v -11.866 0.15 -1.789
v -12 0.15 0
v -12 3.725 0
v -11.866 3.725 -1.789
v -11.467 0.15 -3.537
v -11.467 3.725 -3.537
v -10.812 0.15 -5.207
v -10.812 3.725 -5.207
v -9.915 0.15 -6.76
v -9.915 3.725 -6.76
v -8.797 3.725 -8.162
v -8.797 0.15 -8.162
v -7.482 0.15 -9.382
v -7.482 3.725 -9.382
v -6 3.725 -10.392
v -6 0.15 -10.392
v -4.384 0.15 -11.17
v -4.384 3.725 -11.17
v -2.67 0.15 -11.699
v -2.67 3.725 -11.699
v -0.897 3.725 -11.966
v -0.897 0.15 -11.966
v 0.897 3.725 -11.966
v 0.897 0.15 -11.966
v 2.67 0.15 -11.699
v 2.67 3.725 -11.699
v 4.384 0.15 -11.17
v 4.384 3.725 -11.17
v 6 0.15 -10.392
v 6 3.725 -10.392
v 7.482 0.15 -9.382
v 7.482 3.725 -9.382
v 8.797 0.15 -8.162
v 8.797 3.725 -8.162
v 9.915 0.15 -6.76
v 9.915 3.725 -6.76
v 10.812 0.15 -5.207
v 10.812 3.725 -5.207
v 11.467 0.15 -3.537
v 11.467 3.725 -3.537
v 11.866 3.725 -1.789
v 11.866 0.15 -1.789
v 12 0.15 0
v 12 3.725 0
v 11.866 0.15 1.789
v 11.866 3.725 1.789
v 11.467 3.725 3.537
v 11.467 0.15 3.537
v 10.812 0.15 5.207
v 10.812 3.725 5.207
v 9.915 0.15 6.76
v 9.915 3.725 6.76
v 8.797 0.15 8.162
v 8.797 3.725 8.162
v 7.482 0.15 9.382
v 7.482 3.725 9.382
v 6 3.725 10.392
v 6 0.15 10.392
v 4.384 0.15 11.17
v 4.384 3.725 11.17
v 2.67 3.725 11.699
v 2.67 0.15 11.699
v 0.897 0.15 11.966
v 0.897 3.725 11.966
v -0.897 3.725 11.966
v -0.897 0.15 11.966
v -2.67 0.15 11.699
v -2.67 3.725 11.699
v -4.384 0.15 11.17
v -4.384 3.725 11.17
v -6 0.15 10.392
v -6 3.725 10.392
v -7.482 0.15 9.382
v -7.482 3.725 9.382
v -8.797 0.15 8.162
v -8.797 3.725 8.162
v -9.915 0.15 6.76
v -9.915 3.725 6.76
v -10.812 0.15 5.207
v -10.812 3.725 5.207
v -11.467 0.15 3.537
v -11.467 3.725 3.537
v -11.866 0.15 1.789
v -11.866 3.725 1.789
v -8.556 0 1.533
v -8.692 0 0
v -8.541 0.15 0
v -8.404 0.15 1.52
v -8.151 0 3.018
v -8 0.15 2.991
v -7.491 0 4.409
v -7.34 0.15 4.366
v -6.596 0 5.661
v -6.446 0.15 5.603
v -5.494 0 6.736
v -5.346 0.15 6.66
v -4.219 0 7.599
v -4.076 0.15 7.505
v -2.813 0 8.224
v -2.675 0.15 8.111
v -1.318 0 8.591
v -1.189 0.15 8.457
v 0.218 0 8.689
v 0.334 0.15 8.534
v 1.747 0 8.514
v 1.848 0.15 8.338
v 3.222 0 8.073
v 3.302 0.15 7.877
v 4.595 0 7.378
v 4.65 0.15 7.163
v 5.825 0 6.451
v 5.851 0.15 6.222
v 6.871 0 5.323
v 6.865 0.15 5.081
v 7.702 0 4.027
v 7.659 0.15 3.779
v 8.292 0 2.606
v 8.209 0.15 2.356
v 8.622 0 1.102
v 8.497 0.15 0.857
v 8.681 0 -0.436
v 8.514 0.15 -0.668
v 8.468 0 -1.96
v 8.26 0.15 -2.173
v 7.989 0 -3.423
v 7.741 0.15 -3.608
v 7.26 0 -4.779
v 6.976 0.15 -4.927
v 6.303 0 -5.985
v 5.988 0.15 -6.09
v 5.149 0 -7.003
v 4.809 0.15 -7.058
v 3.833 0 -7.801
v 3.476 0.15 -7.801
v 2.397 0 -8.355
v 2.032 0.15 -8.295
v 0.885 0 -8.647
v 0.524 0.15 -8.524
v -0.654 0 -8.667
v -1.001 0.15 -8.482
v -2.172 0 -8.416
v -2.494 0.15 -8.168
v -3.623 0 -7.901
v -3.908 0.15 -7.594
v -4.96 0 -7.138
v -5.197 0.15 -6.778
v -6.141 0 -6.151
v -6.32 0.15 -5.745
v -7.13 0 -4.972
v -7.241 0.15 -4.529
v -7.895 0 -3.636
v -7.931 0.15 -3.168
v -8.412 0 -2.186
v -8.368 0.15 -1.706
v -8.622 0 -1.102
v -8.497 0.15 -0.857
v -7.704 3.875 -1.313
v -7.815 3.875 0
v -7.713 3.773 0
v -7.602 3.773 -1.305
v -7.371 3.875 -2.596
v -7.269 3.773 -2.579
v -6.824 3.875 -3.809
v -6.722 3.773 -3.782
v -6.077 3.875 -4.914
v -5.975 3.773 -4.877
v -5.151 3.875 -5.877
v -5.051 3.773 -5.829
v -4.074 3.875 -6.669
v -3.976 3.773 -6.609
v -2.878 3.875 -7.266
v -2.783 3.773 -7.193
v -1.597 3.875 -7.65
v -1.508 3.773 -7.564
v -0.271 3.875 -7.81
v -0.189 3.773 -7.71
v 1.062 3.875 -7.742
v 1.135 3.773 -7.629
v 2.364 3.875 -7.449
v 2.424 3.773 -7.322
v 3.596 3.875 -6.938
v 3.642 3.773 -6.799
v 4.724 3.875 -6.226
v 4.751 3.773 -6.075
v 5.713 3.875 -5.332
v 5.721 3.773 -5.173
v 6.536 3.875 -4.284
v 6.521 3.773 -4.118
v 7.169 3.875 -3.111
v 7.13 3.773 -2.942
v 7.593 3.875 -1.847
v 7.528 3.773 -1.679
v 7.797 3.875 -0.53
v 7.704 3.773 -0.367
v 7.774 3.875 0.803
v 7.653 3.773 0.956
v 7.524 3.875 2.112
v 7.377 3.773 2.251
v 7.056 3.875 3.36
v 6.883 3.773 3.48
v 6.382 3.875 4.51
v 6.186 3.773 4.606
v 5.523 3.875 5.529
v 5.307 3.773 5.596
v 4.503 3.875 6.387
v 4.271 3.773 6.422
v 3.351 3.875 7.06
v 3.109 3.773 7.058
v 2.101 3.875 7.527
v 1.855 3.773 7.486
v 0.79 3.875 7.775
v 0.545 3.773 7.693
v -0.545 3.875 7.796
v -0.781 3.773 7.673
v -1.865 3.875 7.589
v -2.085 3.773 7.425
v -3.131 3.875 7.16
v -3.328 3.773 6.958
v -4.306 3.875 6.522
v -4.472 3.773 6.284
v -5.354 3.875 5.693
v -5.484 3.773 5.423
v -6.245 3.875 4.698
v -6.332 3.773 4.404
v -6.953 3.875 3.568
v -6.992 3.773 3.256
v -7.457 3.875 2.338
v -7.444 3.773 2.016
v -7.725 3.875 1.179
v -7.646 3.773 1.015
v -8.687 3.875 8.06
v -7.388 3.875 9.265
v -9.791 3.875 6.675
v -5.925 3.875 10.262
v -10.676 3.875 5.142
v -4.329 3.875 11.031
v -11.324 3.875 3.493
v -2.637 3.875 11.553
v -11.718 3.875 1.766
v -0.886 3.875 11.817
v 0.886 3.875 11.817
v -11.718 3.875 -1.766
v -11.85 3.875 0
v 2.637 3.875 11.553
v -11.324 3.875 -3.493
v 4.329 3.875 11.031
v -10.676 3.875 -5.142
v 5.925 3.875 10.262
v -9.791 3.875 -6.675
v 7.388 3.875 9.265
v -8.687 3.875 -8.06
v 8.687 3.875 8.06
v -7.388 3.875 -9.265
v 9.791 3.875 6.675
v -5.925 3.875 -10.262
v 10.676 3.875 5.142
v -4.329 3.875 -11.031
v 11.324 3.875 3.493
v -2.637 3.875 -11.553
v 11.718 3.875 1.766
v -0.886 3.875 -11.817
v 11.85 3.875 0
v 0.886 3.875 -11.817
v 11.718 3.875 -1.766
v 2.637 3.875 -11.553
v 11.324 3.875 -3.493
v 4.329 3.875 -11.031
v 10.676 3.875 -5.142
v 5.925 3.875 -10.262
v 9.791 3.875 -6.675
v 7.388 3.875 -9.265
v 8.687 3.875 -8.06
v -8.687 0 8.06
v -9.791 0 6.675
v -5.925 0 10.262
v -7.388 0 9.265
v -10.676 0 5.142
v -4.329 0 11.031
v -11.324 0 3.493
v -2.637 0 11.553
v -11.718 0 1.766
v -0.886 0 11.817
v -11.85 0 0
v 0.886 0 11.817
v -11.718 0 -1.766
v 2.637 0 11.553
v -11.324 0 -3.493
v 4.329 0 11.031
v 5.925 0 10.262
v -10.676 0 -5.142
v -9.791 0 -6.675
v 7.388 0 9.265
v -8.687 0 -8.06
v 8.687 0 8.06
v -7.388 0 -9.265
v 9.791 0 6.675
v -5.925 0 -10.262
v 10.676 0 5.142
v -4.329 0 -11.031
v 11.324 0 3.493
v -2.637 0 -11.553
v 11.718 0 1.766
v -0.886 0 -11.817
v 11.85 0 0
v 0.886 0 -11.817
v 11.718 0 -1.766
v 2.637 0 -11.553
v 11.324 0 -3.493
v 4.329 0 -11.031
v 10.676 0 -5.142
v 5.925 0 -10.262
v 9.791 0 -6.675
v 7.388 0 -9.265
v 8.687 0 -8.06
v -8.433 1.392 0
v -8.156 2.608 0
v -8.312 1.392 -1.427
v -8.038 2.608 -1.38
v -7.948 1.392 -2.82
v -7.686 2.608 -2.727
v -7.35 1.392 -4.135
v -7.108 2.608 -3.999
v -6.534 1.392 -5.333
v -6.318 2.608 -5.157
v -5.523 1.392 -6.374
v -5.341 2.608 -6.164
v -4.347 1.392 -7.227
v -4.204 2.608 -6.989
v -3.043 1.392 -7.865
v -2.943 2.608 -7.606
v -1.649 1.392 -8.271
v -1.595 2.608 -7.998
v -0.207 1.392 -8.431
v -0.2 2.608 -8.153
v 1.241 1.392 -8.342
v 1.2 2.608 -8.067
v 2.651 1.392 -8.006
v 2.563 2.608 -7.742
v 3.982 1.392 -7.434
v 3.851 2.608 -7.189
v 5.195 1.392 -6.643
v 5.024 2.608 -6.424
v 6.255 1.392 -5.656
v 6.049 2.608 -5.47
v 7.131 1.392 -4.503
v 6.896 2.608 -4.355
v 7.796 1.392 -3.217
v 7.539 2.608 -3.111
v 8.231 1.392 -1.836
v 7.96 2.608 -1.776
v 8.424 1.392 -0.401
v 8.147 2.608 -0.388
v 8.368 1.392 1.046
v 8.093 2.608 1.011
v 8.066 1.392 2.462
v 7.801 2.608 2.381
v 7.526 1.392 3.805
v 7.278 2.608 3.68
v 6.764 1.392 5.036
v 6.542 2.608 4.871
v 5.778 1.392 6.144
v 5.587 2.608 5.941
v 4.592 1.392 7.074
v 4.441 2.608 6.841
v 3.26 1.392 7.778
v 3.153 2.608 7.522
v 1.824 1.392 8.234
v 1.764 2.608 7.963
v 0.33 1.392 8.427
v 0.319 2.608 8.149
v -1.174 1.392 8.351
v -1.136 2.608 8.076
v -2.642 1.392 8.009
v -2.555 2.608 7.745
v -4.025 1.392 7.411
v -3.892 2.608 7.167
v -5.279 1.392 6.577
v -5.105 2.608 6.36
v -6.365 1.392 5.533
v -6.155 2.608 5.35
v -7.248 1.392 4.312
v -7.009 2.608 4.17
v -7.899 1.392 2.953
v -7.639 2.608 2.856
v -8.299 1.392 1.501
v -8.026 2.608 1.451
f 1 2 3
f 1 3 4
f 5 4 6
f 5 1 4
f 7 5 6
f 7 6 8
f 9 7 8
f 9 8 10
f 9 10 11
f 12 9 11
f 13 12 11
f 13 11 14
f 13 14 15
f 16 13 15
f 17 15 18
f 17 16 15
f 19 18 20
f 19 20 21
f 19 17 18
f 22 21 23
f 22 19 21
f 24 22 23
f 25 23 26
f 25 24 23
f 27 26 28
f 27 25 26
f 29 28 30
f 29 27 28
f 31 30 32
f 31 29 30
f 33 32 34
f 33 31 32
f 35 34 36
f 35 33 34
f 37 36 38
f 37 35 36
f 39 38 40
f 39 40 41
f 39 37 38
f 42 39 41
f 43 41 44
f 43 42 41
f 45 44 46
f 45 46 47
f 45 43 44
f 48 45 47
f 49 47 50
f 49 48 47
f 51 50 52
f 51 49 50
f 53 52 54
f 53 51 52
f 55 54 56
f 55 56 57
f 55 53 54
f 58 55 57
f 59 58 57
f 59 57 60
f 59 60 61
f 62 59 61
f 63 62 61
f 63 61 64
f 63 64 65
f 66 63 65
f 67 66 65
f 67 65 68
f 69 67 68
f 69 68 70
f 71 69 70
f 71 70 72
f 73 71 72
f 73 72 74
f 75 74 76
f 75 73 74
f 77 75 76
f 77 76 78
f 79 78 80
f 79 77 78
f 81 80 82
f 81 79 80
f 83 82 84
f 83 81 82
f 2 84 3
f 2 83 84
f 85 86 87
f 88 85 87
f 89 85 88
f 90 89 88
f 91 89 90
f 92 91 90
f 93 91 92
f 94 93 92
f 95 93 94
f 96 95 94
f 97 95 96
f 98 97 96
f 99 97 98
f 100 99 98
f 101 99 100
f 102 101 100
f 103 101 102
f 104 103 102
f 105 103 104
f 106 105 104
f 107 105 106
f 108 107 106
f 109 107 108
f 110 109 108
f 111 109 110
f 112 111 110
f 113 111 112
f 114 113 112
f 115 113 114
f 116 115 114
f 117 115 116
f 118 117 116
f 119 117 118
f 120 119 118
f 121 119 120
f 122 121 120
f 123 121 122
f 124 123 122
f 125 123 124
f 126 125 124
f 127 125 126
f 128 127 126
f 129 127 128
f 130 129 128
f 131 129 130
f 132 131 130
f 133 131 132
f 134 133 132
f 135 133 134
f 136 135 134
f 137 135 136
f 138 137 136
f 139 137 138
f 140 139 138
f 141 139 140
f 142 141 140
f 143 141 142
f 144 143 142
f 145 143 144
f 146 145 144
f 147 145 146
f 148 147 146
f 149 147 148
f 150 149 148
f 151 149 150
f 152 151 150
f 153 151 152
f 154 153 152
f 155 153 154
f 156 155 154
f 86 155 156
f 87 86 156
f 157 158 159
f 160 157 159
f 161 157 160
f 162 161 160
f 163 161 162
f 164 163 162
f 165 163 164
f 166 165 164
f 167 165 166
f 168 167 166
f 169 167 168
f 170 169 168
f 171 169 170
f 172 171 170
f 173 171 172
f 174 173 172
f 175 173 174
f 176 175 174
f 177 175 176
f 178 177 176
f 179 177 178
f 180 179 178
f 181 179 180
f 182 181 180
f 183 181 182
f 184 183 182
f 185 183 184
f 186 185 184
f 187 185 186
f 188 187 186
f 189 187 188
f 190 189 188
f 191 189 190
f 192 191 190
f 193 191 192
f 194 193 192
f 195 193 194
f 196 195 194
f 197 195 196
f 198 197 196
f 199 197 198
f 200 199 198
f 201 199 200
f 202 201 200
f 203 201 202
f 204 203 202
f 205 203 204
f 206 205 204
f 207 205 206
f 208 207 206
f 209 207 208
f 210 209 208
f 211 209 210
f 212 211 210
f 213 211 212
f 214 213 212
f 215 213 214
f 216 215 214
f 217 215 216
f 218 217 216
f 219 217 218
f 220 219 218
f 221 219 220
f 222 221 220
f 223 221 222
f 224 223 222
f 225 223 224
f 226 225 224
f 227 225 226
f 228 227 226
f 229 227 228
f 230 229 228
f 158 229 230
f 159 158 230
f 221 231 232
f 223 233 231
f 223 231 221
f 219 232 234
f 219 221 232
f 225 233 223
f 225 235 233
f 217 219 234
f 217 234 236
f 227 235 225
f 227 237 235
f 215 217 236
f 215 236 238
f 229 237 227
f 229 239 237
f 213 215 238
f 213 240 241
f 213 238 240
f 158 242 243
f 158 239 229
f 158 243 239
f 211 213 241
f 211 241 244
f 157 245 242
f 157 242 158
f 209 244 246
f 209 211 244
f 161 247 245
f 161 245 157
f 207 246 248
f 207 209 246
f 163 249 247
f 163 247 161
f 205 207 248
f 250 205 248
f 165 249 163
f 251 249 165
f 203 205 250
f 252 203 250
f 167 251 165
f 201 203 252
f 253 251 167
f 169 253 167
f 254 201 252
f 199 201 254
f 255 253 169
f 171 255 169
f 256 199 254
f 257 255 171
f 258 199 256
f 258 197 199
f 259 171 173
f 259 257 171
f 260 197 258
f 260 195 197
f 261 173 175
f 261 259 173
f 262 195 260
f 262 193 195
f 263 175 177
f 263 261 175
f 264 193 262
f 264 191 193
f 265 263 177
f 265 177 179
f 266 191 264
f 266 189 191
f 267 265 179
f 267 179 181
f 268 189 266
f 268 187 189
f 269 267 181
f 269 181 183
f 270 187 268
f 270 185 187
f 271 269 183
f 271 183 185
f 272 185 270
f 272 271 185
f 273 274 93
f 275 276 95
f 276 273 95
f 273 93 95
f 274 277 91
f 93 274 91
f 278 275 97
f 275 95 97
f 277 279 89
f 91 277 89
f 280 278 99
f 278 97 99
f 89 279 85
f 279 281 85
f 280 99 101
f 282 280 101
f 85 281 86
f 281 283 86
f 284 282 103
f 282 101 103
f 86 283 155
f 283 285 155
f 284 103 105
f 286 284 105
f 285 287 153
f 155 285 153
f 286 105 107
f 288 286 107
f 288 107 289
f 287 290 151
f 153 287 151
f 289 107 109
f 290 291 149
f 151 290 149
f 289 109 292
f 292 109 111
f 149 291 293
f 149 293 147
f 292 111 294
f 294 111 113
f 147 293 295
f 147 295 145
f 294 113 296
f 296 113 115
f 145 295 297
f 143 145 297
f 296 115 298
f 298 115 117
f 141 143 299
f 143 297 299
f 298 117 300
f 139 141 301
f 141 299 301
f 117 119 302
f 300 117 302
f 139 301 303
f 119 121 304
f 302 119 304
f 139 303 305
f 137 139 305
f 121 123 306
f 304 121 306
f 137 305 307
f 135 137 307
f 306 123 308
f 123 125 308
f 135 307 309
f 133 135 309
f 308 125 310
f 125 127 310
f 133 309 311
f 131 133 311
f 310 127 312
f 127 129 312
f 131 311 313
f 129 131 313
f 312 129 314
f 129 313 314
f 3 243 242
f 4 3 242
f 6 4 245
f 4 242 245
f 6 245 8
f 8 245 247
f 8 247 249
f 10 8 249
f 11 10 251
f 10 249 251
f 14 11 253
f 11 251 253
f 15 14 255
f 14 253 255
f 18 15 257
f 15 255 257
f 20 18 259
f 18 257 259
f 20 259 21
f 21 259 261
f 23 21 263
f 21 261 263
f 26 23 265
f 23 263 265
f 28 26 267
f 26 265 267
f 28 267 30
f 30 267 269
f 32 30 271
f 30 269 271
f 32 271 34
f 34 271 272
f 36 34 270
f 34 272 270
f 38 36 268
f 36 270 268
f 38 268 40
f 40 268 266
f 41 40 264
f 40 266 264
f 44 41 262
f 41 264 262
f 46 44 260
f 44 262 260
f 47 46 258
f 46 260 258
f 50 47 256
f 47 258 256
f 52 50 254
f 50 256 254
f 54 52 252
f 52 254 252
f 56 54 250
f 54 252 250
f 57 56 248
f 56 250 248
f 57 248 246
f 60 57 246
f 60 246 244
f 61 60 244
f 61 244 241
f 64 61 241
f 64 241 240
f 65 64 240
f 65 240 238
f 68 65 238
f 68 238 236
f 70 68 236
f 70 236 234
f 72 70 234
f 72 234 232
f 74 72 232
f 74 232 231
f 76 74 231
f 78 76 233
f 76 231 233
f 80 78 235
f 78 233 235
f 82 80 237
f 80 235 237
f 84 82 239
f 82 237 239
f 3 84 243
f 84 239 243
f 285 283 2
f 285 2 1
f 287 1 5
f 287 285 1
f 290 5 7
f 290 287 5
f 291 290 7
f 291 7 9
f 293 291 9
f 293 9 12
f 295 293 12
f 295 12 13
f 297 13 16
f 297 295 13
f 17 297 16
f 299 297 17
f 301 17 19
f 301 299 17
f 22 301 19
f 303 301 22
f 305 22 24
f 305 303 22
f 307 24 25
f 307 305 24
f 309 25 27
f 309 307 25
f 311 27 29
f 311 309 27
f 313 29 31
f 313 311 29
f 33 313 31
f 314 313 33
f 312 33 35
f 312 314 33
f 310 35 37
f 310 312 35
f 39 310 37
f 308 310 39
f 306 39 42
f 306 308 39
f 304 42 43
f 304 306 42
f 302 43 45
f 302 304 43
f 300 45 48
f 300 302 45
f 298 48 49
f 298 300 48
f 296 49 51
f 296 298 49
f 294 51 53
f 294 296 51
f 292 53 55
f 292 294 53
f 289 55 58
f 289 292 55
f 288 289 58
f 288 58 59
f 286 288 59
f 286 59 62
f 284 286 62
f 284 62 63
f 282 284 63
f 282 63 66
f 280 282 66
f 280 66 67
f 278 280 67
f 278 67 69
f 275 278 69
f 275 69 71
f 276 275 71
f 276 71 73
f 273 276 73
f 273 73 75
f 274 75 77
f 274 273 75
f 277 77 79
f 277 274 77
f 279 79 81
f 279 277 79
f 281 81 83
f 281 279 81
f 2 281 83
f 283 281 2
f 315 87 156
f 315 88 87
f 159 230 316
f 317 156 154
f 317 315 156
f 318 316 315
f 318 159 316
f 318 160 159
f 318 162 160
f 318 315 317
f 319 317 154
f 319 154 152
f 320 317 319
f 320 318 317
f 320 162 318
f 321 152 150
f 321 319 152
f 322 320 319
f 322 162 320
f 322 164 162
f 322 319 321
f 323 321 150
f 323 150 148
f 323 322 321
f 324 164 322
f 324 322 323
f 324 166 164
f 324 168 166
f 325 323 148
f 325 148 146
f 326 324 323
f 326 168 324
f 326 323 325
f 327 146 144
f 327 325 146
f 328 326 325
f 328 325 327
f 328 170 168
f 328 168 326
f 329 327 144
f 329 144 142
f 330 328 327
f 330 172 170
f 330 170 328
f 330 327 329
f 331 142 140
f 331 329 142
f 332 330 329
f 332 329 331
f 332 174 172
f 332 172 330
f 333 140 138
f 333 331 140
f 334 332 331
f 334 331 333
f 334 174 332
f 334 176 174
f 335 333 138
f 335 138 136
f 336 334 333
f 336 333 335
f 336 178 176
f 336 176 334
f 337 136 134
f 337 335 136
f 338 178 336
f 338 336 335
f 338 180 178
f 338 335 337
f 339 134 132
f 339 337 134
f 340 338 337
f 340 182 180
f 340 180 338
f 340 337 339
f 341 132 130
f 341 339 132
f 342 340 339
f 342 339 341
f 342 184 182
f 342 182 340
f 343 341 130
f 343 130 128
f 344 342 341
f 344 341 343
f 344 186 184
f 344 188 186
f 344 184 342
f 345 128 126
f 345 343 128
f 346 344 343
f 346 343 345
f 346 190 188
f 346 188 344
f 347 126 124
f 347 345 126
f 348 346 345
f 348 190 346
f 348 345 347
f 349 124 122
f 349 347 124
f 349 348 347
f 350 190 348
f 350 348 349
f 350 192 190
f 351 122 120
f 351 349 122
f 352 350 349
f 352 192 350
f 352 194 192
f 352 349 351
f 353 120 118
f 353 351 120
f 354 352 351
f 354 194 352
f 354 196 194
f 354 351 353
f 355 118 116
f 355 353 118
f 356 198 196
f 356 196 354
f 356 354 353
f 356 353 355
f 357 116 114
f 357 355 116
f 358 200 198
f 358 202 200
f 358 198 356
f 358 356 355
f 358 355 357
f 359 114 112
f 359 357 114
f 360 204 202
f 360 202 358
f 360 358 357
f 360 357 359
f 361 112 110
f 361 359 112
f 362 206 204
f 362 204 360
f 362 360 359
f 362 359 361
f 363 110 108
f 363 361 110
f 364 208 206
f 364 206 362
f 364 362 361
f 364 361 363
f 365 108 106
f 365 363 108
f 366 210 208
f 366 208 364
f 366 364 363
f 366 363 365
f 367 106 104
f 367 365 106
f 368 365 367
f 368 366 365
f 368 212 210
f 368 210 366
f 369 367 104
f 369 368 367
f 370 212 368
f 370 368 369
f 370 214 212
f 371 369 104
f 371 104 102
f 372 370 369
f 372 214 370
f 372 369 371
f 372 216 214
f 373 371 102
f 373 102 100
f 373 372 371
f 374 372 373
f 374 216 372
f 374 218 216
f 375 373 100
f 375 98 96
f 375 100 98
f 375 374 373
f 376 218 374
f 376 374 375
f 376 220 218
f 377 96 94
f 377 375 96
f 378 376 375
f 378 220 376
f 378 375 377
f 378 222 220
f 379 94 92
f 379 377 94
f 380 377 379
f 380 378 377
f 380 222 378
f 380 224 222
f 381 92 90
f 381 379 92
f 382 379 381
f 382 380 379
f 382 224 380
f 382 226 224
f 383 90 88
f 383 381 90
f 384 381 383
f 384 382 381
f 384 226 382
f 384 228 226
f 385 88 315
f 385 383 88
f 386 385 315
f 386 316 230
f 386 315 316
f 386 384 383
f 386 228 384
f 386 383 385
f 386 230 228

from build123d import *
from OCP.BRepFilletAPI import BRepFilletAPI_MakeChamfer

# Parameters (mm, degrees)
CUT_EXTRUDE1_DEPTH      = 18.407344018
CUT_EXTRUDE1_DEPTH_BACK = 18.407344018
SKETCH3_W               = 34.205973053
SKETCH3_H               = 8.392509863
CHAMFER1_SIZE           = 0.15
CHAMFER1_SIZE2          = 0.112518034


with BuildPart() as part:
    # Sketch2 → Revolve1 (revolve)
    with BuildSketch(Plane.XY):
        with BuildLine():
            Line((-12, -3.875), (-7.664872763, -3.875))
            ThreePointArc((-7.664872763, -3.875), (-8.541796068, 0), (-7.664872763, 3.875))
            Line((-7.664872763, 3.875), (-12, 3.875))
            Line((-12, 3.875), (-12, -3.875))
        make_face()
    revolve(axis=Axis((0, 6, 0), (0, -1, 0)))

    # Sketch3 → Cut-Extrude1 (cut, two sides: drawn at the far end of the back side and taken through both)
    with BuildSketch(Plane.XY.offset(-CUT_EXTRUDE1_DEPTH_BACK)):
        with Locations((5.102986527, -4.196254932)):
            Rectangle(SKETCH3_W, SKETCH3_H)
    extrude(amount=CUT_EXTRUDE1_DEPTH + CUT_EXTRUDE1_DEPTH_BACK, mode=Mode.SUBTRACT)

    # Chamfer1: one chamfer whose edges measure the first distance from different faces: ONE call of the kernel's chamfer builder (chamfer() names one face for all edges)
    chamfer1_edges_1 = [part.edges().sort_by_distance(p)[0] for p in [
        (12, 0, 0),
        (8.541796067, 0, 0),
        (12, 3.875, 0),
    ]]
    chamfer1_edges_2 = [part.edges().sort_by_distance(p)[0] for p in [
        (7.664872763, 3.875, 0),
    ]]
    chamfer1_side_2 = [part.faces().sort_by_distance(p)[0] for p in [
        (8.004284018, 3.875, 0),
    ]]
    chamfer1 = BRepFilletAPI_MakeChamfer(part.part.solid().wrapped)
    for e in chamfer1_edges_1:
        chamfer1.Add(CHAMFER1_SIZE, e.wrapped)
    for e in chamfer1_edges_2:
        chamfer1.Add(CHAMFER1_SIZE, CHAMFER1_SIZE2, e.wrapped, chamfer1_side_2[0].wrapped)  # the first distance lies on this face
    add(Compound.cast(chamfer1.Shape()), mode=Mode.REPLACE)


solid = part.part
